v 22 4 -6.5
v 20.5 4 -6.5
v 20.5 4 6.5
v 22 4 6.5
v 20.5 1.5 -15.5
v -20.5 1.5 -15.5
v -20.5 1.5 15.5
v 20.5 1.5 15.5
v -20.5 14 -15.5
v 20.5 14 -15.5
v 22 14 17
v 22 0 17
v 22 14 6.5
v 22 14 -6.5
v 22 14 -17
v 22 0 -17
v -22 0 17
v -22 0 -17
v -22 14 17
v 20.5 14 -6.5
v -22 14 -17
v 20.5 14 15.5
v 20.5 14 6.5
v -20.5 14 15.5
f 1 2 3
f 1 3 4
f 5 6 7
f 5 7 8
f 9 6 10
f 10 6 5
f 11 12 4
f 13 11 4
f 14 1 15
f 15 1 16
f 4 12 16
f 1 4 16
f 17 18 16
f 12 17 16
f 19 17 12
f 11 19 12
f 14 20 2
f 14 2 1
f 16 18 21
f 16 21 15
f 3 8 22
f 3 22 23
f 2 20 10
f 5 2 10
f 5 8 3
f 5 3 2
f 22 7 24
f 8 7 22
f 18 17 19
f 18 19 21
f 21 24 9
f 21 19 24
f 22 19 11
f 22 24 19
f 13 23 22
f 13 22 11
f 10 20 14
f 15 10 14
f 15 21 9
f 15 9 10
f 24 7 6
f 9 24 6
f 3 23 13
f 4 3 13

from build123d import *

# Parameters (mm, degrees)
ESQUISSE1_W             = 44
ESQUISSE1_H             = 34
BOSS_EXTRU_1_DEPTH      = 14
COQUE1_T                = -1.5
ESQUISSE2_W             = 1.5
ESQUISSE2_H             = 13
ENL_V_MAT_EXTRU_1_DEPTH = 10


with BuildPart() as part:
    # Esquisse1 → Boss.-Extru.1 (new body)
    with BuildSketch(Plane(origin=(0, 0, 0), x_dir=(1, 0, 0), z_dir=(0, 1, 0))):
        Rectangle(ESQUISSE1_W, ESQUISSE1_H)
    extrude(amount=BOSS_EXTRU_1_DEPTH)

    # Coque1
    coque1_openings = [part.faces().sort_by_distance(p)[0] for p in [
        (0, 14, 0),
    ]]
    offset(amount=COQUE1_T, openings=coque1_openings, kind=Kind.INTERSECTION)

    # Esquisse2 → Enlèv. mat.-Extru.1 (cut)
    with BuildSketch(Plane(origin=(0, 14, 0), x_dir=(1, 0, 0), z_dir=(0, 1, 0))):
        with Locations((21.25, 0)):
            Rectangle(ESQUISSE2_W, ESQUISSE2_H)
    extrude(amount=-ENL_V_MAT_EXTRU_1_DEPTH, mode=Mode.SUBTRACT)


solid = part.part
